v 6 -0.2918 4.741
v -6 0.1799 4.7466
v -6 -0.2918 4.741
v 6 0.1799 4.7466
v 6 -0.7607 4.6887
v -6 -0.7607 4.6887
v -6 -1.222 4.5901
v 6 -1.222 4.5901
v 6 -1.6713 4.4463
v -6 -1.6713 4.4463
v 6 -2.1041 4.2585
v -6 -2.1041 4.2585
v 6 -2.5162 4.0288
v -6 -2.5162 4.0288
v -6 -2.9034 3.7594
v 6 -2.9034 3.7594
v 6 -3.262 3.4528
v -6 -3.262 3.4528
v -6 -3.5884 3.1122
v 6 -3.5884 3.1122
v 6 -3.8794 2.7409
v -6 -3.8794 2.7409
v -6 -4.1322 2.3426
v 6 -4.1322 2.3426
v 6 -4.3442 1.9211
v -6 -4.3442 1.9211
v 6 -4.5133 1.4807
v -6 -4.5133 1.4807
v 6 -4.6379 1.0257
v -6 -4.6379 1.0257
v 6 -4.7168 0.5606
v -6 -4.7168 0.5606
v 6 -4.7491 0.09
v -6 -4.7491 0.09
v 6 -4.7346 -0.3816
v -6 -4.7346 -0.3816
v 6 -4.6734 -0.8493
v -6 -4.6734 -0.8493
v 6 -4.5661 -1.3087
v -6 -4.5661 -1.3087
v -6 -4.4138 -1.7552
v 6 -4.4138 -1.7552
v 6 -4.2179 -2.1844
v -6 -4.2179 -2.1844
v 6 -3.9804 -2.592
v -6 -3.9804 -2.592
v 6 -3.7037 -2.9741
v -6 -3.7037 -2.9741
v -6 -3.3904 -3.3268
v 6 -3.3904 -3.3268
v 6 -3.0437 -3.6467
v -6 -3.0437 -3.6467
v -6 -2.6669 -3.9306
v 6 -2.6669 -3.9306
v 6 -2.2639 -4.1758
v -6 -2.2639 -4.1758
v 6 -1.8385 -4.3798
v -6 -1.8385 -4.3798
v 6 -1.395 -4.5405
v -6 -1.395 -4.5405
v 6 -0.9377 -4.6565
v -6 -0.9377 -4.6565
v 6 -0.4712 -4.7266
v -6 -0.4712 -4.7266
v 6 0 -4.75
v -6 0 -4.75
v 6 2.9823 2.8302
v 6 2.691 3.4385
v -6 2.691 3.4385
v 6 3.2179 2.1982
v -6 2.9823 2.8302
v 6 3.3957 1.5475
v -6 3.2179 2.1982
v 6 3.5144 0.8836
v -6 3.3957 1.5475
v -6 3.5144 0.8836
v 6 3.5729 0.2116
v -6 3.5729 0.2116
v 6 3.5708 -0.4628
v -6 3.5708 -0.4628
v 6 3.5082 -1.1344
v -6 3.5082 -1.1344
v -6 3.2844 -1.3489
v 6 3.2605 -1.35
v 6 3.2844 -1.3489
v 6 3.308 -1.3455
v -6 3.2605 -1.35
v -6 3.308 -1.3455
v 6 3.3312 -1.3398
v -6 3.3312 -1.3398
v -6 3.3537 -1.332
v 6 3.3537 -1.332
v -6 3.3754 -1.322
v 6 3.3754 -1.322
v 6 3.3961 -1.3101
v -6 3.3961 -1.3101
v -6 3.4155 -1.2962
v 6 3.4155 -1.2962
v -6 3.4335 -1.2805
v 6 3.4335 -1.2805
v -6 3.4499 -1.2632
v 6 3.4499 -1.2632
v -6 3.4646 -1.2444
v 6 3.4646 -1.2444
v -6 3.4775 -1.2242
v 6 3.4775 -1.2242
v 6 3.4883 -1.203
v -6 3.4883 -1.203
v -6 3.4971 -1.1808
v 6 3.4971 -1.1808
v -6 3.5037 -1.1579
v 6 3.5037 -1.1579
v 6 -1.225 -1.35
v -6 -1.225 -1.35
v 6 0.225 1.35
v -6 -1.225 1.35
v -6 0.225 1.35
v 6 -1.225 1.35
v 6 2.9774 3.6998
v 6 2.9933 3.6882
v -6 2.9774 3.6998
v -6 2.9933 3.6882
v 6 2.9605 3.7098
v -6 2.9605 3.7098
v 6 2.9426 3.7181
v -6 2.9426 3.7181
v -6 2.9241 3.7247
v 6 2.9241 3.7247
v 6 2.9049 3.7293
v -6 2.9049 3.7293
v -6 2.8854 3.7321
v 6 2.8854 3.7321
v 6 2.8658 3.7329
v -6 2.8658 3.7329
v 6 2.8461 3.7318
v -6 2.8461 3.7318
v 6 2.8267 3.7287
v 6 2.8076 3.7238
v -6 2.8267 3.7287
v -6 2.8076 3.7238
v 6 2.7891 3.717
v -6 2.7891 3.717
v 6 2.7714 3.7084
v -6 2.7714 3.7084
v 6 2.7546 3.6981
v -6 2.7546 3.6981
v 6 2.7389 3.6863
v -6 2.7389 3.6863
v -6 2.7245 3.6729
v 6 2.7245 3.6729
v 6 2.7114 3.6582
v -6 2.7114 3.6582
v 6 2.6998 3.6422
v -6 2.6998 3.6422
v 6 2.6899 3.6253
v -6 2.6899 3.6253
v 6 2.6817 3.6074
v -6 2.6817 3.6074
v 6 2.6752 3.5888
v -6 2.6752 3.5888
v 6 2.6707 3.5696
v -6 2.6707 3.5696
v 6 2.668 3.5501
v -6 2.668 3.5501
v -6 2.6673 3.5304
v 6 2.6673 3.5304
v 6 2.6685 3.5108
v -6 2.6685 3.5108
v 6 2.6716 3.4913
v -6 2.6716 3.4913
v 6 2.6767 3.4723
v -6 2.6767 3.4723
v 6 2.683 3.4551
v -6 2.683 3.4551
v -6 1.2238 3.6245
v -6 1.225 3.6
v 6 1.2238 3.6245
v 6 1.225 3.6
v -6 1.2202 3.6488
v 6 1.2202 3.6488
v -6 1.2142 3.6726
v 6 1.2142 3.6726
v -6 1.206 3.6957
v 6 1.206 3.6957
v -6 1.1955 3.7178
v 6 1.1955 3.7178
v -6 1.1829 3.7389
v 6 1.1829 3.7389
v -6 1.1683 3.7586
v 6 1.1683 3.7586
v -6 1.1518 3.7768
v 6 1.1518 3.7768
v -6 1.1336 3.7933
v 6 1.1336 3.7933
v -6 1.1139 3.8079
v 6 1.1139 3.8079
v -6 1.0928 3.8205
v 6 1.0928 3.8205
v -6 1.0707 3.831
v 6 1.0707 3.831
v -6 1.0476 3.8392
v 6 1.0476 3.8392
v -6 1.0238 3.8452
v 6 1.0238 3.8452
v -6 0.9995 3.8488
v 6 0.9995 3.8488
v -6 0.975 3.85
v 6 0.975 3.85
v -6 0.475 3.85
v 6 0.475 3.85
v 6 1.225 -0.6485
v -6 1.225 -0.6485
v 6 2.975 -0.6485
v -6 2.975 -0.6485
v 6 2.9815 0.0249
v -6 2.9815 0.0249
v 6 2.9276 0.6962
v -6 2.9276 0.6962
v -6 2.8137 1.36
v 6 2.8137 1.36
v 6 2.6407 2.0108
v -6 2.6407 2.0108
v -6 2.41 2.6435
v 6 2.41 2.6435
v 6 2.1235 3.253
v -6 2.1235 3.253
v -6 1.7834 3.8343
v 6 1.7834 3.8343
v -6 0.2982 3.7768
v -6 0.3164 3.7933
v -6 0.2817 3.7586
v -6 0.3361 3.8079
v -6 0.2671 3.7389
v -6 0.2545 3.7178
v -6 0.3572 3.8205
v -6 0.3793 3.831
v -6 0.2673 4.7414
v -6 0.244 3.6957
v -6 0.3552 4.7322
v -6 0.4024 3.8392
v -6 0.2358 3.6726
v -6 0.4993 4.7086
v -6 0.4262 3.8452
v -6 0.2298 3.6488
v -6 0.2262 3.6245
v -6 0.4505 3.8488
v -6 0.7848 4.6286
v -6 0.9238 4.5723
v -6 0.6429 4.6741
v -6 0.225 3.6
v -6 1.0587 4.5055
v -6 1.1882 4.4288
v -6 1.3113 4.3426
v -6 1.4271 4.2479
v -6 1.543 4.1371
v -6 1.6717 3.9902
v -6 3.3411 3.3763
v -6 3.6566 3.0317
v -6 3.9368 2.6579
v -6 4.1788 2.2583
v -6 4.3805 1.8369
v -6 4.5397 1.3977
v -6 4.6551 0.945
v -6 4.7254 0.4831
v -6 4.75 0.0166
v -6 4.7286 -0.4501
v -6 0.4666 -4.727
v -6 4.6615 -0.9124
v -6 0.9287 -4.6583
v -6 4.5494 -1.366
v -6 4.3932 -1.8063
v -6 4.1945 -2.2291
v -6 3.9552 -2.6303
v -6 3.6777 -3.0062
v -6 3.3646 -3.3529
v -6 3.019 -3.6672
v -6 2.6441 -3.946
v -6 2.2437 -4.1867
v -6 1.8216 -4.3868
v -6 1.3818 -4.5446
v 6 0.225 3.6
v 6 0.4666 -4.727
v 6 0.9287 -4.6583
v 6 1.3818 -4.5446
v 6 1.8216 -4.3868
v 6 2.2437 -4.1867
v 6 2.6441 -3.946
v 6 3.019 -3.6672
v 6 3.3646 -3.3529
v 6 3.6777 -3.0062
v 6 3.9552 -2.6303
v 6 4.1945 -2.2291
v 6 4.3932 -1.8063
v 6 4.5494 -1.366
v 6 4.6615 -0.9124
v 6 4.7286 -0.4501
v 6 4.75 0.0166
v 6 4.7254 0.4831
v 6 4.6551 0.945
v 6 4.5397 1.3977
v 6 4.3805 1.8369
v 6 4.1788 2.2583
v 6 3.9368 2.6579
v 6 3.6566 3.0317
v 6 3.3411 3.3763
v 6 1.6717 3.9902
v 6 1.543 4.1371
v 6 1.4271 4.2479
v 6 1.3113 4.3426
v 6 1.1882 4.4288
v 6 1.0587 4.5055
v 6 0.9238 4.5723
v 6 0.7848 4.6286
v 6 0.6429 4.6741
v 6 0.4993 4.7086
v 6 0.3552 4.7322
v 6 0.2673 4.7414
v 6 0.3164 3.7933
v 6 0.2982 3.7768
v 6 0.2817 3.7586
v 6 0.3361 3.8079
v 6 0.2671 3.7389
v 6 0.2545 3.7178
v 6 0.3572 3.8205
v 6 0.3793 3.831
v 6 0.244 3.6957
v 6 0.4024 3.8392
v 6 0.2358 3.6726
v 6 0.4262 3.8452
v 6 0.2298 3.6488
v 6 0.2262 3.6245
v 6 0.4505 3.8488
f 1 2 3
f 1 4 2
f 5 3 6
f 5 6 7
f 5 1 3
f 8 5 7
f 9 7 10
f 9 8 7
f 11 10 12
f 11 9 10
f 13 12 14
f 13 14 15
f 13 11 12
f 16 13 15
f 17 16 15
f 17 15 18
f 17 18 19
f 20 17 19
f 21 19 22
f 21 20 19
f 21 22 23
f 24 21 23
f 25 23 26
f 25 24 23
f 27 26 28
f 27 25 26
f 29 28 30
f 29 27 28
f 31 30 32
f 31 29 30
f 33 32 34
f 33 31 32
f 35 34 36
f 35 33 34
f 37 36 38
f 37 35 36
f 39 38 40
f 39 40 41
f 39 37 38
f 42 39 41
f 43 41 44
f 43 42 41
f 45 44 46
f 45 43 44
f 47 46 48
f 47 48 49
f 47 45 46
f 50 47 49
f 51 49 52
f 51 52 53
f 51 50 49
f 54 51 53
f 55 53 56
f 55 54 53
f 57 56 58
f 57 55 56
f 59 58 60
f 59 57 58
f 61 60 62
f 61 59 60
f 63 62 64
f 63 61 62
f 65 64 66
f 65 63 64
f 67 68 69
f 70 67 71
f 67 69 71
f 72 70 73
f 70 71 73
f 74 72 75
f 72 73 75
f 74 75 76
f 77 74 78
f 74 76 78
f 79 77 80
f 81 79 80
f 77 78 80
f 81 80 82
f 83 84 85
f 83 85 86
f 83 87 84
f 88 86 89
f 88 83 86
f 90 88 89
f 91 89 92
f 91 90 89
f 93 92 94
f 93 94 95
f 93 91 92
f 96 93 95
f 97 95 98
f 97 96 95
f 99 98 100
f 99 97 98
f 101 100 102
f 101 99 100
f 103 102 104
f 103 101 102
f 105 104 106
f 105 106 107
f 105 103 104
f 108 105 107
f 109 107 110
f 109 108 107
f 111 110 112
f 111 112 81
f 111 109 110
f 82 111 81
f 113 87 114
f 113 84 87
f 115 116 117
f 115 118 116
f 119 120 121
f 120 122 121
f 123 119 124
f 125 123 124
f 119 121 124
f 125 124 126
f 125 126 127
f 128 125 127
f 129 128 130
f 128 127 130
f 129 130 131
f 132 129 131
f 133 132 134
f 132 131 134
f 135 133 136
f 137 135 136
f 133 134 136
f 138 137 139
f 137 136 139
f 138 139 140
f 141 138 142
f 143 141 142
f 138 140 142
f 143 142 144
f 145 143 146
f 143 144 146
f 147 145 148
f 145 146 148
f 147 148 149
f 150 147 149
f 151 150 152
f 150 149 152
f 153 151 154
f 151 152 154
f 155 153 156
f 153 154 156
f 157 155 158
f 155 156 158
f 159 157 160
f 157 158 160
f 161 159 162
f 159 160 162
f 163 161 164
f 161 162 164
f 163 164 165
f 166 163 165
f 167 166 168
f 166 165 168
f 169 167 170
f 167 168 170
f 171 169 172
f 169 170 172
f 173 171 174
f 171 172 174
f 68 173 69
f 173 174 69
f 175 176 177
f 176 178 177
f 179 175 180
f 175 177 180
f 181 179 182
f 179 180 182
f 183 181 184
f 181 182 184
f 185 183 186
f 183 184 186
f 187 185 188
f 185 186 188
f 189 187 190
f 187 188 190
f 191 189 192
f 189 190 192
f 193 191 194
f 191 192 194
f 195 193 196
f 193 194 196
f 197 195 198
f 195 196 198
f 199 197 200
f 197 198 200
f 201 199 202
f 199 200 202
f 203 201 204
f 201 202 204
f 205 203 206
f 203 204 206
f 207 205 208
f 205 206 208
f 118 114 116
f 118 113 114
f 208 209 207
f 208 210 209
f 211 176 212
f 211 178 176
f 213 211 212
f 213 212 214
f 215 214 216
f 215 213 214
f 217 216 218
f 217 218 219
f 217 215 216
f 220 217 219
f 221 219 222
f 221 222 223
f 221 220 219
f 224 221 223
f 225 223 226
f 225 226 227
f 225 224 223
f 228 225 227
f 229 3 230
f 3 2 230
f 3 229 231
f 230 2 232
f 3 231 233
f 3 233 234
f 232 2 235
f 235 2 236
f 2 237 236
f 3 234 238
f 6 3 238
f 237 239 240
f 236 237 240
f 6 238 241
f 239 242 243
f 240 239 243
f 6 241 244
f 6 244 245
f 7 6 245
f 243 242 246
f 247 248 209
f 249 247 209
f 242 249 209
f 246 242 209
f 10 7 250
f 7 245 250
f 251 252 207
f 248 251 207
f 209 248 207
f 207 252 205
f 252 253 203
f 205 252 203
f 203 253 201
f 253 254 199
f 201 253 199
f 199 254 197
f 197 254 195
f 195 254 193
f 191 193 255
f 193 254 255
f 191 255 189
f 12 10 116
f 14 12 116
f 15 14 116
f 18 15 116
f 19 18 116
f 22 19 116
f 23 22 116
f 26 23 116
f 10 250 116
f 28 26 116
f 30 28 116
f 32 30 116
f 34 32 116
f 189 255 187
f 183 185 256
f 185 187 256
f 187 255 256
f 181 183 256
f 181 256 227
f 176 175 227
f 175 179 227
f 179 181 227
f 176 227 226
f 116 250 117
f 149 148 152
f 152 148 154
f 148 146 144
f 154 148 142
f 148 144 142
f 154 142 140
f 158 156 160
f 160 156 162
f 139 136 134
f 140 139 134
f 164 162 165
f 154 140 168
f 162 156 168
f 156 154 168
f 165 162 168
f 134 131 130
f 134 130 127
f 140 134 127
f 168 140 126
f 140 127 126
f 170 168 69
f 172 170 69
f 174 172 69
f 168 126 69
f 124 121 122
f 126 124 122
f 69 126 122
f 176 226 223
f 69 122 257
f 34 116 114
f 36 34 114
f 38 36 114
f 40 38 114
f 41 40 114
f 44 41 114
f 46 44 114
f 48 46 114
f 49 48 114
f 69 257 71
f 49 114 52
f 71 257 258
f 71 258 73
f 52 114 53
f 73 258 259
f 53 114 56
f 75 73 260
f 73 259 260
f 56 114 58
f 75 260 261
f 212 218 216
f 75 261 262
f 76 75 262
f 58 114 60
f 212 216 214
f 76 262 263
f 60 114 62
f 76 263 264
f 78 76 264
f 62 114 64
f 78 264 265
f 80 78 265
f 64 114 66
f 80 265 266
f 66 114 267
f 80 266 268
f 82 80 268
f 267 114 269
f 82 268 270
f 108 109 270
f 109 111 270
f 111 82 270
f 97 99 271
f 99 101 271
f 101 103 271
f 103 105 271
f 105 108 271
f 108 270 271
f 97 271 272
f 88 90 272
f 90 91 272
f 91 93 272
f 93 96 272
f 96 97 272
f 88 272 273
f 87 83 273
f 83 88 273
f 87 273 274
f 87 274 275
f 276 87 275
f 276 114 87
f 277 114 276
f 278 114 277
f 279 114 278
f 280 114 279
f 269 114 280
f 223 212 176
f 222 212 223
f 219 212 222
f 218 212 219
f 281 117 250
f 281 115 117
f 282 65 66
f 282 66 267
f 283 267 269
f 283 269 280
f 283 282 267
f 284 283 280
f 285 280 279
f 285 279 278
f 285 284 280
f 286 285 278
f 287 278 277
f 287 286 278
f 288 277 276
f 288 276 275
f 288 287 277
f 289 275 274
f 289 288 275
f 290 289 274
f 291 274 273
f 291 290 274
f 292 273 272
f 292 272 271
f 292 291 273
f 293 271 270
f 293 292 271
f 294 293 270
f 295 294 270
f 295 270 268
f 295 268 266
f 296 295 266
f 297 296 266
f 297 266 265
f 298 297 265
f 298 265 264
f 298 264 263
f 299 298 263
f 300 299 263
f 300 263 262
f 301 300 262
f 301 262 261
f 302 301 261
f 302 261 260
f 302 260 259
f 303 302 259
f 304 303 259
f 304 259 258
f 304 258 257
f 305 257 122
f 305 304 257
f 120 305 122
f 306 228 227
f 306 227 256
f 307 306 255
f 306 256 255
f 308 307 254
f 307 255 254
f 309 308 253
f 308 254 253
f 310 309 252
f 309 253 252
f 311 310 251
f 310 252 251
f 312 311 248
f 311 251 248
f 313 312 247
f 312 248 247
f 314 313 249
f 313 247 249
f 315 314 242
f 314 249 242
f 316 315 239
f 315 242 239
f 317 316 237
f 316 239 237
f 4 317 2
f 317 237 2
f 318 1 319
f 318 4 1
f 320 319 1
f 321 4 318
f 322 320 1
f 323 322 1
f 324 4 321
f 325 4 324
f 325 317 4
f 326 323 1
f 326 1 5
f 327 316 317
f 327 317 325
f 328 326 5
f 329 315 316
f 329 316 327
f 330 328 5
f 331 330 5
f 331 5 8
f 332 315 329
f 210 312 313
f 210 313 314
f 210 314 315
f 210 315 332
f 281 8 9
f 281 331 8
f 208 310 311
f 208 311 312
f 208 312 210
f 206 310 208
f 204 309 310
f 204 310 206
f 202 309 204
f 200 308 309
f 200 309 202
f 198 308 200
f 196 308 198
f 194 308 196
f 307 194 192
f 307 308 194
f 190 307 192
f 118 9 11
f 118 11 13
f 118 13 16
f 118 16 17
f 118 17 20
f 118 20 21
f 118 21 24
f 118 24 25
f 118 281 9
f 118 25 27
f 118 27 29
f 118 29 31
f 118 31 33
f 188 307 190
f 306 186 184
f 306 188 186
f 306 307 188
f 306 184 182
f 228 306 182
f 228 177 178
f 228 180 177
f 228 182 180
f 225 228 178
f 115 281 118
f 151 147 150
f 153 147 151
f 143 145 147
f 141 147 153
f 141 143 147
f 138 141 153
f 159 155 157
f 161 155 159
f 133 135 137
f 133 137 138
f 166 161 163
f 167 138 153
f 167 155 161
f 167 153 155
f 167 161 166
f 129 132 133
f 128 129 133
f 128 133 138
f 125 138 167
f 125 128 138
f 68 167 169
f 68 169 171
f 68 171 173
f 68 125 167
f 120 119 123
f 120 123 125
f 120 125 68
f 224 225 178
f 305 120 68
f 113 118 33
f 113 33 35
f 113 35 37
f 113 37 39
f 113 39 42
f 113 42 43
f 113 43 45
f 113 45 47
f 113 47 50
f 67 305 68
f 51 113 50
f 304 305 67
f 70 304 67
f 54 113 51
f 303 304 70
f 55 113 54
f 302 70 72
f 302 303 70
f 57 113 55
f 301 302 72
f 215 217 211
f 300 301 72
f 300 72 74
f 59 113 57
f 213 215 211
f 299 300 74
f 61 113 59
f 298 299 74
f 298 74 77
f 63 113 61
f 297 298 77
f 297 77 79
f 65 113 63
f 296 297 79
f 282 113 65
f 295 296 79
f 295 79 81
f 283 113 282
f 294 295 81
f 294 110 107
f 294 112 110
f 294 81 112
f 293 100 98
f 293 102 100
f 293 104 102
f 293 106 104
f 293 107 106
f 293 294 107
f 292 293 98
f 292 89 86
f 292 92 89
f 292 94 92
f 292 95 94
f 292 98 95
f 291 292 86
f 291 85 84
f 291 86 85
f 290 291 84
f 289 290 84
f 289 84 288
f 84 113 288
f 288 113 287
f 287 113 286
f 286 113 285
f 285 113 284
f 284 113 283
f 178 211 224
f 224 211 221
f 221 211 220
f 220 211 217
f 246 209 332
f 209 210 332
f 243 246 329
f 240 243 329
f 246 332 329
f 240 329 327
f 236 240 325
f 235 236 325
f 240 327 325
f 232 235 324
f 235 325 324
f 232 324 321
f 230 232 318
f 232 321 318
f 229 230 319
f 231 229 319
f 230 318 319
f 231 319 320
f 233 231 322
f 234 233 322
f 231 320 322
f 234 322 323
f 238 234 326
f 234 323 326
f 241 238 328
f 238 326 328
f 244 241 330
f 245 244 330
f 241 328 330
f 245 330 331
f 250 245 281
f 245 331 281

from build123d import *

# Parameters (mm, degrees)
BOSS_EXTRUDE2_DEPTH = 6
FILLET1_R           = 0.25
FILLET2_R           = 2
FILLET3_R           = 0.2


with BuildPart() as part:
    # Sketch1 → Boss-Extrude2 (new, symmetric)
    with BuildSketch(Plane(origin=(0, 0, 0), x_dir=(0, 0, -1), z_dir=(1, 0, 0))):
        with BuildLine():
            Line((-1.35, -1.225), (-1.35, 0.225))
            Line((-1.35, 0.225), (-3.85, 0.225))
            Line((-3.85, 0.225), (-3.85, 1.225))
            Line((-3.85, 1.225), (-1.35, 1.225))
            Line((-1.35, 1.225), (0.648540494, 1.225))
            Line((0.648540494, 1.225), (0.648540494, 2.975))
            ThreePointArc((0.648540494, 2.975), (-2.137325495, 2.599646629), (-4.589321845, 1.225))
            ThreePointArc((-4.589321845, 1.225), (-0.617746402, -4.709659158), (4.75, 0))
            ThreePointArc((4.75, 0), (1.146387884, 4.609587272), (-4.19665045, 2.225))
            ThreePointArc((-4.19665045, 2.225), (-1.546369522, 3.395986963), (1.35, 3.475))
            Line((1.35, 3.475), (1.35, 1.225))
            Line((1.35, 1.225), (1.35, -1.225))
            Line((1.35, -1.225), (-1.35, -1.225))
        make_face()
    extrude(amount=BOSS_EXTRUDE2_DEPTH, both=True)

    # Fillet1
    fillet1_edges = [part.edges().sort_by_distance(p)[0] for p in [
        (0, 1.225, 3.85),
        (0, 0.225, 3.85),
        (0, 3.475, -1.35),
    ]]
    fillet(fillet1_edges, radius=FILLET1_R)

    # Fillet2
    fillet2_edges = [part.edges().sort_by_distance(p)[0] for p in [
        (0, 1.225, 4.589321845),
    ]]
    fillet(fillet2_edges, radius=FILLET2_R)

    # Fillet3
    fillet3_edges = [part.edges().sort_by_distance(p)[0] for p in [
        (0, 2.225, 4.19665045),
    ]]
    fillet(fillet3_edges, radius=FILLET3_R)


solid = part.part
